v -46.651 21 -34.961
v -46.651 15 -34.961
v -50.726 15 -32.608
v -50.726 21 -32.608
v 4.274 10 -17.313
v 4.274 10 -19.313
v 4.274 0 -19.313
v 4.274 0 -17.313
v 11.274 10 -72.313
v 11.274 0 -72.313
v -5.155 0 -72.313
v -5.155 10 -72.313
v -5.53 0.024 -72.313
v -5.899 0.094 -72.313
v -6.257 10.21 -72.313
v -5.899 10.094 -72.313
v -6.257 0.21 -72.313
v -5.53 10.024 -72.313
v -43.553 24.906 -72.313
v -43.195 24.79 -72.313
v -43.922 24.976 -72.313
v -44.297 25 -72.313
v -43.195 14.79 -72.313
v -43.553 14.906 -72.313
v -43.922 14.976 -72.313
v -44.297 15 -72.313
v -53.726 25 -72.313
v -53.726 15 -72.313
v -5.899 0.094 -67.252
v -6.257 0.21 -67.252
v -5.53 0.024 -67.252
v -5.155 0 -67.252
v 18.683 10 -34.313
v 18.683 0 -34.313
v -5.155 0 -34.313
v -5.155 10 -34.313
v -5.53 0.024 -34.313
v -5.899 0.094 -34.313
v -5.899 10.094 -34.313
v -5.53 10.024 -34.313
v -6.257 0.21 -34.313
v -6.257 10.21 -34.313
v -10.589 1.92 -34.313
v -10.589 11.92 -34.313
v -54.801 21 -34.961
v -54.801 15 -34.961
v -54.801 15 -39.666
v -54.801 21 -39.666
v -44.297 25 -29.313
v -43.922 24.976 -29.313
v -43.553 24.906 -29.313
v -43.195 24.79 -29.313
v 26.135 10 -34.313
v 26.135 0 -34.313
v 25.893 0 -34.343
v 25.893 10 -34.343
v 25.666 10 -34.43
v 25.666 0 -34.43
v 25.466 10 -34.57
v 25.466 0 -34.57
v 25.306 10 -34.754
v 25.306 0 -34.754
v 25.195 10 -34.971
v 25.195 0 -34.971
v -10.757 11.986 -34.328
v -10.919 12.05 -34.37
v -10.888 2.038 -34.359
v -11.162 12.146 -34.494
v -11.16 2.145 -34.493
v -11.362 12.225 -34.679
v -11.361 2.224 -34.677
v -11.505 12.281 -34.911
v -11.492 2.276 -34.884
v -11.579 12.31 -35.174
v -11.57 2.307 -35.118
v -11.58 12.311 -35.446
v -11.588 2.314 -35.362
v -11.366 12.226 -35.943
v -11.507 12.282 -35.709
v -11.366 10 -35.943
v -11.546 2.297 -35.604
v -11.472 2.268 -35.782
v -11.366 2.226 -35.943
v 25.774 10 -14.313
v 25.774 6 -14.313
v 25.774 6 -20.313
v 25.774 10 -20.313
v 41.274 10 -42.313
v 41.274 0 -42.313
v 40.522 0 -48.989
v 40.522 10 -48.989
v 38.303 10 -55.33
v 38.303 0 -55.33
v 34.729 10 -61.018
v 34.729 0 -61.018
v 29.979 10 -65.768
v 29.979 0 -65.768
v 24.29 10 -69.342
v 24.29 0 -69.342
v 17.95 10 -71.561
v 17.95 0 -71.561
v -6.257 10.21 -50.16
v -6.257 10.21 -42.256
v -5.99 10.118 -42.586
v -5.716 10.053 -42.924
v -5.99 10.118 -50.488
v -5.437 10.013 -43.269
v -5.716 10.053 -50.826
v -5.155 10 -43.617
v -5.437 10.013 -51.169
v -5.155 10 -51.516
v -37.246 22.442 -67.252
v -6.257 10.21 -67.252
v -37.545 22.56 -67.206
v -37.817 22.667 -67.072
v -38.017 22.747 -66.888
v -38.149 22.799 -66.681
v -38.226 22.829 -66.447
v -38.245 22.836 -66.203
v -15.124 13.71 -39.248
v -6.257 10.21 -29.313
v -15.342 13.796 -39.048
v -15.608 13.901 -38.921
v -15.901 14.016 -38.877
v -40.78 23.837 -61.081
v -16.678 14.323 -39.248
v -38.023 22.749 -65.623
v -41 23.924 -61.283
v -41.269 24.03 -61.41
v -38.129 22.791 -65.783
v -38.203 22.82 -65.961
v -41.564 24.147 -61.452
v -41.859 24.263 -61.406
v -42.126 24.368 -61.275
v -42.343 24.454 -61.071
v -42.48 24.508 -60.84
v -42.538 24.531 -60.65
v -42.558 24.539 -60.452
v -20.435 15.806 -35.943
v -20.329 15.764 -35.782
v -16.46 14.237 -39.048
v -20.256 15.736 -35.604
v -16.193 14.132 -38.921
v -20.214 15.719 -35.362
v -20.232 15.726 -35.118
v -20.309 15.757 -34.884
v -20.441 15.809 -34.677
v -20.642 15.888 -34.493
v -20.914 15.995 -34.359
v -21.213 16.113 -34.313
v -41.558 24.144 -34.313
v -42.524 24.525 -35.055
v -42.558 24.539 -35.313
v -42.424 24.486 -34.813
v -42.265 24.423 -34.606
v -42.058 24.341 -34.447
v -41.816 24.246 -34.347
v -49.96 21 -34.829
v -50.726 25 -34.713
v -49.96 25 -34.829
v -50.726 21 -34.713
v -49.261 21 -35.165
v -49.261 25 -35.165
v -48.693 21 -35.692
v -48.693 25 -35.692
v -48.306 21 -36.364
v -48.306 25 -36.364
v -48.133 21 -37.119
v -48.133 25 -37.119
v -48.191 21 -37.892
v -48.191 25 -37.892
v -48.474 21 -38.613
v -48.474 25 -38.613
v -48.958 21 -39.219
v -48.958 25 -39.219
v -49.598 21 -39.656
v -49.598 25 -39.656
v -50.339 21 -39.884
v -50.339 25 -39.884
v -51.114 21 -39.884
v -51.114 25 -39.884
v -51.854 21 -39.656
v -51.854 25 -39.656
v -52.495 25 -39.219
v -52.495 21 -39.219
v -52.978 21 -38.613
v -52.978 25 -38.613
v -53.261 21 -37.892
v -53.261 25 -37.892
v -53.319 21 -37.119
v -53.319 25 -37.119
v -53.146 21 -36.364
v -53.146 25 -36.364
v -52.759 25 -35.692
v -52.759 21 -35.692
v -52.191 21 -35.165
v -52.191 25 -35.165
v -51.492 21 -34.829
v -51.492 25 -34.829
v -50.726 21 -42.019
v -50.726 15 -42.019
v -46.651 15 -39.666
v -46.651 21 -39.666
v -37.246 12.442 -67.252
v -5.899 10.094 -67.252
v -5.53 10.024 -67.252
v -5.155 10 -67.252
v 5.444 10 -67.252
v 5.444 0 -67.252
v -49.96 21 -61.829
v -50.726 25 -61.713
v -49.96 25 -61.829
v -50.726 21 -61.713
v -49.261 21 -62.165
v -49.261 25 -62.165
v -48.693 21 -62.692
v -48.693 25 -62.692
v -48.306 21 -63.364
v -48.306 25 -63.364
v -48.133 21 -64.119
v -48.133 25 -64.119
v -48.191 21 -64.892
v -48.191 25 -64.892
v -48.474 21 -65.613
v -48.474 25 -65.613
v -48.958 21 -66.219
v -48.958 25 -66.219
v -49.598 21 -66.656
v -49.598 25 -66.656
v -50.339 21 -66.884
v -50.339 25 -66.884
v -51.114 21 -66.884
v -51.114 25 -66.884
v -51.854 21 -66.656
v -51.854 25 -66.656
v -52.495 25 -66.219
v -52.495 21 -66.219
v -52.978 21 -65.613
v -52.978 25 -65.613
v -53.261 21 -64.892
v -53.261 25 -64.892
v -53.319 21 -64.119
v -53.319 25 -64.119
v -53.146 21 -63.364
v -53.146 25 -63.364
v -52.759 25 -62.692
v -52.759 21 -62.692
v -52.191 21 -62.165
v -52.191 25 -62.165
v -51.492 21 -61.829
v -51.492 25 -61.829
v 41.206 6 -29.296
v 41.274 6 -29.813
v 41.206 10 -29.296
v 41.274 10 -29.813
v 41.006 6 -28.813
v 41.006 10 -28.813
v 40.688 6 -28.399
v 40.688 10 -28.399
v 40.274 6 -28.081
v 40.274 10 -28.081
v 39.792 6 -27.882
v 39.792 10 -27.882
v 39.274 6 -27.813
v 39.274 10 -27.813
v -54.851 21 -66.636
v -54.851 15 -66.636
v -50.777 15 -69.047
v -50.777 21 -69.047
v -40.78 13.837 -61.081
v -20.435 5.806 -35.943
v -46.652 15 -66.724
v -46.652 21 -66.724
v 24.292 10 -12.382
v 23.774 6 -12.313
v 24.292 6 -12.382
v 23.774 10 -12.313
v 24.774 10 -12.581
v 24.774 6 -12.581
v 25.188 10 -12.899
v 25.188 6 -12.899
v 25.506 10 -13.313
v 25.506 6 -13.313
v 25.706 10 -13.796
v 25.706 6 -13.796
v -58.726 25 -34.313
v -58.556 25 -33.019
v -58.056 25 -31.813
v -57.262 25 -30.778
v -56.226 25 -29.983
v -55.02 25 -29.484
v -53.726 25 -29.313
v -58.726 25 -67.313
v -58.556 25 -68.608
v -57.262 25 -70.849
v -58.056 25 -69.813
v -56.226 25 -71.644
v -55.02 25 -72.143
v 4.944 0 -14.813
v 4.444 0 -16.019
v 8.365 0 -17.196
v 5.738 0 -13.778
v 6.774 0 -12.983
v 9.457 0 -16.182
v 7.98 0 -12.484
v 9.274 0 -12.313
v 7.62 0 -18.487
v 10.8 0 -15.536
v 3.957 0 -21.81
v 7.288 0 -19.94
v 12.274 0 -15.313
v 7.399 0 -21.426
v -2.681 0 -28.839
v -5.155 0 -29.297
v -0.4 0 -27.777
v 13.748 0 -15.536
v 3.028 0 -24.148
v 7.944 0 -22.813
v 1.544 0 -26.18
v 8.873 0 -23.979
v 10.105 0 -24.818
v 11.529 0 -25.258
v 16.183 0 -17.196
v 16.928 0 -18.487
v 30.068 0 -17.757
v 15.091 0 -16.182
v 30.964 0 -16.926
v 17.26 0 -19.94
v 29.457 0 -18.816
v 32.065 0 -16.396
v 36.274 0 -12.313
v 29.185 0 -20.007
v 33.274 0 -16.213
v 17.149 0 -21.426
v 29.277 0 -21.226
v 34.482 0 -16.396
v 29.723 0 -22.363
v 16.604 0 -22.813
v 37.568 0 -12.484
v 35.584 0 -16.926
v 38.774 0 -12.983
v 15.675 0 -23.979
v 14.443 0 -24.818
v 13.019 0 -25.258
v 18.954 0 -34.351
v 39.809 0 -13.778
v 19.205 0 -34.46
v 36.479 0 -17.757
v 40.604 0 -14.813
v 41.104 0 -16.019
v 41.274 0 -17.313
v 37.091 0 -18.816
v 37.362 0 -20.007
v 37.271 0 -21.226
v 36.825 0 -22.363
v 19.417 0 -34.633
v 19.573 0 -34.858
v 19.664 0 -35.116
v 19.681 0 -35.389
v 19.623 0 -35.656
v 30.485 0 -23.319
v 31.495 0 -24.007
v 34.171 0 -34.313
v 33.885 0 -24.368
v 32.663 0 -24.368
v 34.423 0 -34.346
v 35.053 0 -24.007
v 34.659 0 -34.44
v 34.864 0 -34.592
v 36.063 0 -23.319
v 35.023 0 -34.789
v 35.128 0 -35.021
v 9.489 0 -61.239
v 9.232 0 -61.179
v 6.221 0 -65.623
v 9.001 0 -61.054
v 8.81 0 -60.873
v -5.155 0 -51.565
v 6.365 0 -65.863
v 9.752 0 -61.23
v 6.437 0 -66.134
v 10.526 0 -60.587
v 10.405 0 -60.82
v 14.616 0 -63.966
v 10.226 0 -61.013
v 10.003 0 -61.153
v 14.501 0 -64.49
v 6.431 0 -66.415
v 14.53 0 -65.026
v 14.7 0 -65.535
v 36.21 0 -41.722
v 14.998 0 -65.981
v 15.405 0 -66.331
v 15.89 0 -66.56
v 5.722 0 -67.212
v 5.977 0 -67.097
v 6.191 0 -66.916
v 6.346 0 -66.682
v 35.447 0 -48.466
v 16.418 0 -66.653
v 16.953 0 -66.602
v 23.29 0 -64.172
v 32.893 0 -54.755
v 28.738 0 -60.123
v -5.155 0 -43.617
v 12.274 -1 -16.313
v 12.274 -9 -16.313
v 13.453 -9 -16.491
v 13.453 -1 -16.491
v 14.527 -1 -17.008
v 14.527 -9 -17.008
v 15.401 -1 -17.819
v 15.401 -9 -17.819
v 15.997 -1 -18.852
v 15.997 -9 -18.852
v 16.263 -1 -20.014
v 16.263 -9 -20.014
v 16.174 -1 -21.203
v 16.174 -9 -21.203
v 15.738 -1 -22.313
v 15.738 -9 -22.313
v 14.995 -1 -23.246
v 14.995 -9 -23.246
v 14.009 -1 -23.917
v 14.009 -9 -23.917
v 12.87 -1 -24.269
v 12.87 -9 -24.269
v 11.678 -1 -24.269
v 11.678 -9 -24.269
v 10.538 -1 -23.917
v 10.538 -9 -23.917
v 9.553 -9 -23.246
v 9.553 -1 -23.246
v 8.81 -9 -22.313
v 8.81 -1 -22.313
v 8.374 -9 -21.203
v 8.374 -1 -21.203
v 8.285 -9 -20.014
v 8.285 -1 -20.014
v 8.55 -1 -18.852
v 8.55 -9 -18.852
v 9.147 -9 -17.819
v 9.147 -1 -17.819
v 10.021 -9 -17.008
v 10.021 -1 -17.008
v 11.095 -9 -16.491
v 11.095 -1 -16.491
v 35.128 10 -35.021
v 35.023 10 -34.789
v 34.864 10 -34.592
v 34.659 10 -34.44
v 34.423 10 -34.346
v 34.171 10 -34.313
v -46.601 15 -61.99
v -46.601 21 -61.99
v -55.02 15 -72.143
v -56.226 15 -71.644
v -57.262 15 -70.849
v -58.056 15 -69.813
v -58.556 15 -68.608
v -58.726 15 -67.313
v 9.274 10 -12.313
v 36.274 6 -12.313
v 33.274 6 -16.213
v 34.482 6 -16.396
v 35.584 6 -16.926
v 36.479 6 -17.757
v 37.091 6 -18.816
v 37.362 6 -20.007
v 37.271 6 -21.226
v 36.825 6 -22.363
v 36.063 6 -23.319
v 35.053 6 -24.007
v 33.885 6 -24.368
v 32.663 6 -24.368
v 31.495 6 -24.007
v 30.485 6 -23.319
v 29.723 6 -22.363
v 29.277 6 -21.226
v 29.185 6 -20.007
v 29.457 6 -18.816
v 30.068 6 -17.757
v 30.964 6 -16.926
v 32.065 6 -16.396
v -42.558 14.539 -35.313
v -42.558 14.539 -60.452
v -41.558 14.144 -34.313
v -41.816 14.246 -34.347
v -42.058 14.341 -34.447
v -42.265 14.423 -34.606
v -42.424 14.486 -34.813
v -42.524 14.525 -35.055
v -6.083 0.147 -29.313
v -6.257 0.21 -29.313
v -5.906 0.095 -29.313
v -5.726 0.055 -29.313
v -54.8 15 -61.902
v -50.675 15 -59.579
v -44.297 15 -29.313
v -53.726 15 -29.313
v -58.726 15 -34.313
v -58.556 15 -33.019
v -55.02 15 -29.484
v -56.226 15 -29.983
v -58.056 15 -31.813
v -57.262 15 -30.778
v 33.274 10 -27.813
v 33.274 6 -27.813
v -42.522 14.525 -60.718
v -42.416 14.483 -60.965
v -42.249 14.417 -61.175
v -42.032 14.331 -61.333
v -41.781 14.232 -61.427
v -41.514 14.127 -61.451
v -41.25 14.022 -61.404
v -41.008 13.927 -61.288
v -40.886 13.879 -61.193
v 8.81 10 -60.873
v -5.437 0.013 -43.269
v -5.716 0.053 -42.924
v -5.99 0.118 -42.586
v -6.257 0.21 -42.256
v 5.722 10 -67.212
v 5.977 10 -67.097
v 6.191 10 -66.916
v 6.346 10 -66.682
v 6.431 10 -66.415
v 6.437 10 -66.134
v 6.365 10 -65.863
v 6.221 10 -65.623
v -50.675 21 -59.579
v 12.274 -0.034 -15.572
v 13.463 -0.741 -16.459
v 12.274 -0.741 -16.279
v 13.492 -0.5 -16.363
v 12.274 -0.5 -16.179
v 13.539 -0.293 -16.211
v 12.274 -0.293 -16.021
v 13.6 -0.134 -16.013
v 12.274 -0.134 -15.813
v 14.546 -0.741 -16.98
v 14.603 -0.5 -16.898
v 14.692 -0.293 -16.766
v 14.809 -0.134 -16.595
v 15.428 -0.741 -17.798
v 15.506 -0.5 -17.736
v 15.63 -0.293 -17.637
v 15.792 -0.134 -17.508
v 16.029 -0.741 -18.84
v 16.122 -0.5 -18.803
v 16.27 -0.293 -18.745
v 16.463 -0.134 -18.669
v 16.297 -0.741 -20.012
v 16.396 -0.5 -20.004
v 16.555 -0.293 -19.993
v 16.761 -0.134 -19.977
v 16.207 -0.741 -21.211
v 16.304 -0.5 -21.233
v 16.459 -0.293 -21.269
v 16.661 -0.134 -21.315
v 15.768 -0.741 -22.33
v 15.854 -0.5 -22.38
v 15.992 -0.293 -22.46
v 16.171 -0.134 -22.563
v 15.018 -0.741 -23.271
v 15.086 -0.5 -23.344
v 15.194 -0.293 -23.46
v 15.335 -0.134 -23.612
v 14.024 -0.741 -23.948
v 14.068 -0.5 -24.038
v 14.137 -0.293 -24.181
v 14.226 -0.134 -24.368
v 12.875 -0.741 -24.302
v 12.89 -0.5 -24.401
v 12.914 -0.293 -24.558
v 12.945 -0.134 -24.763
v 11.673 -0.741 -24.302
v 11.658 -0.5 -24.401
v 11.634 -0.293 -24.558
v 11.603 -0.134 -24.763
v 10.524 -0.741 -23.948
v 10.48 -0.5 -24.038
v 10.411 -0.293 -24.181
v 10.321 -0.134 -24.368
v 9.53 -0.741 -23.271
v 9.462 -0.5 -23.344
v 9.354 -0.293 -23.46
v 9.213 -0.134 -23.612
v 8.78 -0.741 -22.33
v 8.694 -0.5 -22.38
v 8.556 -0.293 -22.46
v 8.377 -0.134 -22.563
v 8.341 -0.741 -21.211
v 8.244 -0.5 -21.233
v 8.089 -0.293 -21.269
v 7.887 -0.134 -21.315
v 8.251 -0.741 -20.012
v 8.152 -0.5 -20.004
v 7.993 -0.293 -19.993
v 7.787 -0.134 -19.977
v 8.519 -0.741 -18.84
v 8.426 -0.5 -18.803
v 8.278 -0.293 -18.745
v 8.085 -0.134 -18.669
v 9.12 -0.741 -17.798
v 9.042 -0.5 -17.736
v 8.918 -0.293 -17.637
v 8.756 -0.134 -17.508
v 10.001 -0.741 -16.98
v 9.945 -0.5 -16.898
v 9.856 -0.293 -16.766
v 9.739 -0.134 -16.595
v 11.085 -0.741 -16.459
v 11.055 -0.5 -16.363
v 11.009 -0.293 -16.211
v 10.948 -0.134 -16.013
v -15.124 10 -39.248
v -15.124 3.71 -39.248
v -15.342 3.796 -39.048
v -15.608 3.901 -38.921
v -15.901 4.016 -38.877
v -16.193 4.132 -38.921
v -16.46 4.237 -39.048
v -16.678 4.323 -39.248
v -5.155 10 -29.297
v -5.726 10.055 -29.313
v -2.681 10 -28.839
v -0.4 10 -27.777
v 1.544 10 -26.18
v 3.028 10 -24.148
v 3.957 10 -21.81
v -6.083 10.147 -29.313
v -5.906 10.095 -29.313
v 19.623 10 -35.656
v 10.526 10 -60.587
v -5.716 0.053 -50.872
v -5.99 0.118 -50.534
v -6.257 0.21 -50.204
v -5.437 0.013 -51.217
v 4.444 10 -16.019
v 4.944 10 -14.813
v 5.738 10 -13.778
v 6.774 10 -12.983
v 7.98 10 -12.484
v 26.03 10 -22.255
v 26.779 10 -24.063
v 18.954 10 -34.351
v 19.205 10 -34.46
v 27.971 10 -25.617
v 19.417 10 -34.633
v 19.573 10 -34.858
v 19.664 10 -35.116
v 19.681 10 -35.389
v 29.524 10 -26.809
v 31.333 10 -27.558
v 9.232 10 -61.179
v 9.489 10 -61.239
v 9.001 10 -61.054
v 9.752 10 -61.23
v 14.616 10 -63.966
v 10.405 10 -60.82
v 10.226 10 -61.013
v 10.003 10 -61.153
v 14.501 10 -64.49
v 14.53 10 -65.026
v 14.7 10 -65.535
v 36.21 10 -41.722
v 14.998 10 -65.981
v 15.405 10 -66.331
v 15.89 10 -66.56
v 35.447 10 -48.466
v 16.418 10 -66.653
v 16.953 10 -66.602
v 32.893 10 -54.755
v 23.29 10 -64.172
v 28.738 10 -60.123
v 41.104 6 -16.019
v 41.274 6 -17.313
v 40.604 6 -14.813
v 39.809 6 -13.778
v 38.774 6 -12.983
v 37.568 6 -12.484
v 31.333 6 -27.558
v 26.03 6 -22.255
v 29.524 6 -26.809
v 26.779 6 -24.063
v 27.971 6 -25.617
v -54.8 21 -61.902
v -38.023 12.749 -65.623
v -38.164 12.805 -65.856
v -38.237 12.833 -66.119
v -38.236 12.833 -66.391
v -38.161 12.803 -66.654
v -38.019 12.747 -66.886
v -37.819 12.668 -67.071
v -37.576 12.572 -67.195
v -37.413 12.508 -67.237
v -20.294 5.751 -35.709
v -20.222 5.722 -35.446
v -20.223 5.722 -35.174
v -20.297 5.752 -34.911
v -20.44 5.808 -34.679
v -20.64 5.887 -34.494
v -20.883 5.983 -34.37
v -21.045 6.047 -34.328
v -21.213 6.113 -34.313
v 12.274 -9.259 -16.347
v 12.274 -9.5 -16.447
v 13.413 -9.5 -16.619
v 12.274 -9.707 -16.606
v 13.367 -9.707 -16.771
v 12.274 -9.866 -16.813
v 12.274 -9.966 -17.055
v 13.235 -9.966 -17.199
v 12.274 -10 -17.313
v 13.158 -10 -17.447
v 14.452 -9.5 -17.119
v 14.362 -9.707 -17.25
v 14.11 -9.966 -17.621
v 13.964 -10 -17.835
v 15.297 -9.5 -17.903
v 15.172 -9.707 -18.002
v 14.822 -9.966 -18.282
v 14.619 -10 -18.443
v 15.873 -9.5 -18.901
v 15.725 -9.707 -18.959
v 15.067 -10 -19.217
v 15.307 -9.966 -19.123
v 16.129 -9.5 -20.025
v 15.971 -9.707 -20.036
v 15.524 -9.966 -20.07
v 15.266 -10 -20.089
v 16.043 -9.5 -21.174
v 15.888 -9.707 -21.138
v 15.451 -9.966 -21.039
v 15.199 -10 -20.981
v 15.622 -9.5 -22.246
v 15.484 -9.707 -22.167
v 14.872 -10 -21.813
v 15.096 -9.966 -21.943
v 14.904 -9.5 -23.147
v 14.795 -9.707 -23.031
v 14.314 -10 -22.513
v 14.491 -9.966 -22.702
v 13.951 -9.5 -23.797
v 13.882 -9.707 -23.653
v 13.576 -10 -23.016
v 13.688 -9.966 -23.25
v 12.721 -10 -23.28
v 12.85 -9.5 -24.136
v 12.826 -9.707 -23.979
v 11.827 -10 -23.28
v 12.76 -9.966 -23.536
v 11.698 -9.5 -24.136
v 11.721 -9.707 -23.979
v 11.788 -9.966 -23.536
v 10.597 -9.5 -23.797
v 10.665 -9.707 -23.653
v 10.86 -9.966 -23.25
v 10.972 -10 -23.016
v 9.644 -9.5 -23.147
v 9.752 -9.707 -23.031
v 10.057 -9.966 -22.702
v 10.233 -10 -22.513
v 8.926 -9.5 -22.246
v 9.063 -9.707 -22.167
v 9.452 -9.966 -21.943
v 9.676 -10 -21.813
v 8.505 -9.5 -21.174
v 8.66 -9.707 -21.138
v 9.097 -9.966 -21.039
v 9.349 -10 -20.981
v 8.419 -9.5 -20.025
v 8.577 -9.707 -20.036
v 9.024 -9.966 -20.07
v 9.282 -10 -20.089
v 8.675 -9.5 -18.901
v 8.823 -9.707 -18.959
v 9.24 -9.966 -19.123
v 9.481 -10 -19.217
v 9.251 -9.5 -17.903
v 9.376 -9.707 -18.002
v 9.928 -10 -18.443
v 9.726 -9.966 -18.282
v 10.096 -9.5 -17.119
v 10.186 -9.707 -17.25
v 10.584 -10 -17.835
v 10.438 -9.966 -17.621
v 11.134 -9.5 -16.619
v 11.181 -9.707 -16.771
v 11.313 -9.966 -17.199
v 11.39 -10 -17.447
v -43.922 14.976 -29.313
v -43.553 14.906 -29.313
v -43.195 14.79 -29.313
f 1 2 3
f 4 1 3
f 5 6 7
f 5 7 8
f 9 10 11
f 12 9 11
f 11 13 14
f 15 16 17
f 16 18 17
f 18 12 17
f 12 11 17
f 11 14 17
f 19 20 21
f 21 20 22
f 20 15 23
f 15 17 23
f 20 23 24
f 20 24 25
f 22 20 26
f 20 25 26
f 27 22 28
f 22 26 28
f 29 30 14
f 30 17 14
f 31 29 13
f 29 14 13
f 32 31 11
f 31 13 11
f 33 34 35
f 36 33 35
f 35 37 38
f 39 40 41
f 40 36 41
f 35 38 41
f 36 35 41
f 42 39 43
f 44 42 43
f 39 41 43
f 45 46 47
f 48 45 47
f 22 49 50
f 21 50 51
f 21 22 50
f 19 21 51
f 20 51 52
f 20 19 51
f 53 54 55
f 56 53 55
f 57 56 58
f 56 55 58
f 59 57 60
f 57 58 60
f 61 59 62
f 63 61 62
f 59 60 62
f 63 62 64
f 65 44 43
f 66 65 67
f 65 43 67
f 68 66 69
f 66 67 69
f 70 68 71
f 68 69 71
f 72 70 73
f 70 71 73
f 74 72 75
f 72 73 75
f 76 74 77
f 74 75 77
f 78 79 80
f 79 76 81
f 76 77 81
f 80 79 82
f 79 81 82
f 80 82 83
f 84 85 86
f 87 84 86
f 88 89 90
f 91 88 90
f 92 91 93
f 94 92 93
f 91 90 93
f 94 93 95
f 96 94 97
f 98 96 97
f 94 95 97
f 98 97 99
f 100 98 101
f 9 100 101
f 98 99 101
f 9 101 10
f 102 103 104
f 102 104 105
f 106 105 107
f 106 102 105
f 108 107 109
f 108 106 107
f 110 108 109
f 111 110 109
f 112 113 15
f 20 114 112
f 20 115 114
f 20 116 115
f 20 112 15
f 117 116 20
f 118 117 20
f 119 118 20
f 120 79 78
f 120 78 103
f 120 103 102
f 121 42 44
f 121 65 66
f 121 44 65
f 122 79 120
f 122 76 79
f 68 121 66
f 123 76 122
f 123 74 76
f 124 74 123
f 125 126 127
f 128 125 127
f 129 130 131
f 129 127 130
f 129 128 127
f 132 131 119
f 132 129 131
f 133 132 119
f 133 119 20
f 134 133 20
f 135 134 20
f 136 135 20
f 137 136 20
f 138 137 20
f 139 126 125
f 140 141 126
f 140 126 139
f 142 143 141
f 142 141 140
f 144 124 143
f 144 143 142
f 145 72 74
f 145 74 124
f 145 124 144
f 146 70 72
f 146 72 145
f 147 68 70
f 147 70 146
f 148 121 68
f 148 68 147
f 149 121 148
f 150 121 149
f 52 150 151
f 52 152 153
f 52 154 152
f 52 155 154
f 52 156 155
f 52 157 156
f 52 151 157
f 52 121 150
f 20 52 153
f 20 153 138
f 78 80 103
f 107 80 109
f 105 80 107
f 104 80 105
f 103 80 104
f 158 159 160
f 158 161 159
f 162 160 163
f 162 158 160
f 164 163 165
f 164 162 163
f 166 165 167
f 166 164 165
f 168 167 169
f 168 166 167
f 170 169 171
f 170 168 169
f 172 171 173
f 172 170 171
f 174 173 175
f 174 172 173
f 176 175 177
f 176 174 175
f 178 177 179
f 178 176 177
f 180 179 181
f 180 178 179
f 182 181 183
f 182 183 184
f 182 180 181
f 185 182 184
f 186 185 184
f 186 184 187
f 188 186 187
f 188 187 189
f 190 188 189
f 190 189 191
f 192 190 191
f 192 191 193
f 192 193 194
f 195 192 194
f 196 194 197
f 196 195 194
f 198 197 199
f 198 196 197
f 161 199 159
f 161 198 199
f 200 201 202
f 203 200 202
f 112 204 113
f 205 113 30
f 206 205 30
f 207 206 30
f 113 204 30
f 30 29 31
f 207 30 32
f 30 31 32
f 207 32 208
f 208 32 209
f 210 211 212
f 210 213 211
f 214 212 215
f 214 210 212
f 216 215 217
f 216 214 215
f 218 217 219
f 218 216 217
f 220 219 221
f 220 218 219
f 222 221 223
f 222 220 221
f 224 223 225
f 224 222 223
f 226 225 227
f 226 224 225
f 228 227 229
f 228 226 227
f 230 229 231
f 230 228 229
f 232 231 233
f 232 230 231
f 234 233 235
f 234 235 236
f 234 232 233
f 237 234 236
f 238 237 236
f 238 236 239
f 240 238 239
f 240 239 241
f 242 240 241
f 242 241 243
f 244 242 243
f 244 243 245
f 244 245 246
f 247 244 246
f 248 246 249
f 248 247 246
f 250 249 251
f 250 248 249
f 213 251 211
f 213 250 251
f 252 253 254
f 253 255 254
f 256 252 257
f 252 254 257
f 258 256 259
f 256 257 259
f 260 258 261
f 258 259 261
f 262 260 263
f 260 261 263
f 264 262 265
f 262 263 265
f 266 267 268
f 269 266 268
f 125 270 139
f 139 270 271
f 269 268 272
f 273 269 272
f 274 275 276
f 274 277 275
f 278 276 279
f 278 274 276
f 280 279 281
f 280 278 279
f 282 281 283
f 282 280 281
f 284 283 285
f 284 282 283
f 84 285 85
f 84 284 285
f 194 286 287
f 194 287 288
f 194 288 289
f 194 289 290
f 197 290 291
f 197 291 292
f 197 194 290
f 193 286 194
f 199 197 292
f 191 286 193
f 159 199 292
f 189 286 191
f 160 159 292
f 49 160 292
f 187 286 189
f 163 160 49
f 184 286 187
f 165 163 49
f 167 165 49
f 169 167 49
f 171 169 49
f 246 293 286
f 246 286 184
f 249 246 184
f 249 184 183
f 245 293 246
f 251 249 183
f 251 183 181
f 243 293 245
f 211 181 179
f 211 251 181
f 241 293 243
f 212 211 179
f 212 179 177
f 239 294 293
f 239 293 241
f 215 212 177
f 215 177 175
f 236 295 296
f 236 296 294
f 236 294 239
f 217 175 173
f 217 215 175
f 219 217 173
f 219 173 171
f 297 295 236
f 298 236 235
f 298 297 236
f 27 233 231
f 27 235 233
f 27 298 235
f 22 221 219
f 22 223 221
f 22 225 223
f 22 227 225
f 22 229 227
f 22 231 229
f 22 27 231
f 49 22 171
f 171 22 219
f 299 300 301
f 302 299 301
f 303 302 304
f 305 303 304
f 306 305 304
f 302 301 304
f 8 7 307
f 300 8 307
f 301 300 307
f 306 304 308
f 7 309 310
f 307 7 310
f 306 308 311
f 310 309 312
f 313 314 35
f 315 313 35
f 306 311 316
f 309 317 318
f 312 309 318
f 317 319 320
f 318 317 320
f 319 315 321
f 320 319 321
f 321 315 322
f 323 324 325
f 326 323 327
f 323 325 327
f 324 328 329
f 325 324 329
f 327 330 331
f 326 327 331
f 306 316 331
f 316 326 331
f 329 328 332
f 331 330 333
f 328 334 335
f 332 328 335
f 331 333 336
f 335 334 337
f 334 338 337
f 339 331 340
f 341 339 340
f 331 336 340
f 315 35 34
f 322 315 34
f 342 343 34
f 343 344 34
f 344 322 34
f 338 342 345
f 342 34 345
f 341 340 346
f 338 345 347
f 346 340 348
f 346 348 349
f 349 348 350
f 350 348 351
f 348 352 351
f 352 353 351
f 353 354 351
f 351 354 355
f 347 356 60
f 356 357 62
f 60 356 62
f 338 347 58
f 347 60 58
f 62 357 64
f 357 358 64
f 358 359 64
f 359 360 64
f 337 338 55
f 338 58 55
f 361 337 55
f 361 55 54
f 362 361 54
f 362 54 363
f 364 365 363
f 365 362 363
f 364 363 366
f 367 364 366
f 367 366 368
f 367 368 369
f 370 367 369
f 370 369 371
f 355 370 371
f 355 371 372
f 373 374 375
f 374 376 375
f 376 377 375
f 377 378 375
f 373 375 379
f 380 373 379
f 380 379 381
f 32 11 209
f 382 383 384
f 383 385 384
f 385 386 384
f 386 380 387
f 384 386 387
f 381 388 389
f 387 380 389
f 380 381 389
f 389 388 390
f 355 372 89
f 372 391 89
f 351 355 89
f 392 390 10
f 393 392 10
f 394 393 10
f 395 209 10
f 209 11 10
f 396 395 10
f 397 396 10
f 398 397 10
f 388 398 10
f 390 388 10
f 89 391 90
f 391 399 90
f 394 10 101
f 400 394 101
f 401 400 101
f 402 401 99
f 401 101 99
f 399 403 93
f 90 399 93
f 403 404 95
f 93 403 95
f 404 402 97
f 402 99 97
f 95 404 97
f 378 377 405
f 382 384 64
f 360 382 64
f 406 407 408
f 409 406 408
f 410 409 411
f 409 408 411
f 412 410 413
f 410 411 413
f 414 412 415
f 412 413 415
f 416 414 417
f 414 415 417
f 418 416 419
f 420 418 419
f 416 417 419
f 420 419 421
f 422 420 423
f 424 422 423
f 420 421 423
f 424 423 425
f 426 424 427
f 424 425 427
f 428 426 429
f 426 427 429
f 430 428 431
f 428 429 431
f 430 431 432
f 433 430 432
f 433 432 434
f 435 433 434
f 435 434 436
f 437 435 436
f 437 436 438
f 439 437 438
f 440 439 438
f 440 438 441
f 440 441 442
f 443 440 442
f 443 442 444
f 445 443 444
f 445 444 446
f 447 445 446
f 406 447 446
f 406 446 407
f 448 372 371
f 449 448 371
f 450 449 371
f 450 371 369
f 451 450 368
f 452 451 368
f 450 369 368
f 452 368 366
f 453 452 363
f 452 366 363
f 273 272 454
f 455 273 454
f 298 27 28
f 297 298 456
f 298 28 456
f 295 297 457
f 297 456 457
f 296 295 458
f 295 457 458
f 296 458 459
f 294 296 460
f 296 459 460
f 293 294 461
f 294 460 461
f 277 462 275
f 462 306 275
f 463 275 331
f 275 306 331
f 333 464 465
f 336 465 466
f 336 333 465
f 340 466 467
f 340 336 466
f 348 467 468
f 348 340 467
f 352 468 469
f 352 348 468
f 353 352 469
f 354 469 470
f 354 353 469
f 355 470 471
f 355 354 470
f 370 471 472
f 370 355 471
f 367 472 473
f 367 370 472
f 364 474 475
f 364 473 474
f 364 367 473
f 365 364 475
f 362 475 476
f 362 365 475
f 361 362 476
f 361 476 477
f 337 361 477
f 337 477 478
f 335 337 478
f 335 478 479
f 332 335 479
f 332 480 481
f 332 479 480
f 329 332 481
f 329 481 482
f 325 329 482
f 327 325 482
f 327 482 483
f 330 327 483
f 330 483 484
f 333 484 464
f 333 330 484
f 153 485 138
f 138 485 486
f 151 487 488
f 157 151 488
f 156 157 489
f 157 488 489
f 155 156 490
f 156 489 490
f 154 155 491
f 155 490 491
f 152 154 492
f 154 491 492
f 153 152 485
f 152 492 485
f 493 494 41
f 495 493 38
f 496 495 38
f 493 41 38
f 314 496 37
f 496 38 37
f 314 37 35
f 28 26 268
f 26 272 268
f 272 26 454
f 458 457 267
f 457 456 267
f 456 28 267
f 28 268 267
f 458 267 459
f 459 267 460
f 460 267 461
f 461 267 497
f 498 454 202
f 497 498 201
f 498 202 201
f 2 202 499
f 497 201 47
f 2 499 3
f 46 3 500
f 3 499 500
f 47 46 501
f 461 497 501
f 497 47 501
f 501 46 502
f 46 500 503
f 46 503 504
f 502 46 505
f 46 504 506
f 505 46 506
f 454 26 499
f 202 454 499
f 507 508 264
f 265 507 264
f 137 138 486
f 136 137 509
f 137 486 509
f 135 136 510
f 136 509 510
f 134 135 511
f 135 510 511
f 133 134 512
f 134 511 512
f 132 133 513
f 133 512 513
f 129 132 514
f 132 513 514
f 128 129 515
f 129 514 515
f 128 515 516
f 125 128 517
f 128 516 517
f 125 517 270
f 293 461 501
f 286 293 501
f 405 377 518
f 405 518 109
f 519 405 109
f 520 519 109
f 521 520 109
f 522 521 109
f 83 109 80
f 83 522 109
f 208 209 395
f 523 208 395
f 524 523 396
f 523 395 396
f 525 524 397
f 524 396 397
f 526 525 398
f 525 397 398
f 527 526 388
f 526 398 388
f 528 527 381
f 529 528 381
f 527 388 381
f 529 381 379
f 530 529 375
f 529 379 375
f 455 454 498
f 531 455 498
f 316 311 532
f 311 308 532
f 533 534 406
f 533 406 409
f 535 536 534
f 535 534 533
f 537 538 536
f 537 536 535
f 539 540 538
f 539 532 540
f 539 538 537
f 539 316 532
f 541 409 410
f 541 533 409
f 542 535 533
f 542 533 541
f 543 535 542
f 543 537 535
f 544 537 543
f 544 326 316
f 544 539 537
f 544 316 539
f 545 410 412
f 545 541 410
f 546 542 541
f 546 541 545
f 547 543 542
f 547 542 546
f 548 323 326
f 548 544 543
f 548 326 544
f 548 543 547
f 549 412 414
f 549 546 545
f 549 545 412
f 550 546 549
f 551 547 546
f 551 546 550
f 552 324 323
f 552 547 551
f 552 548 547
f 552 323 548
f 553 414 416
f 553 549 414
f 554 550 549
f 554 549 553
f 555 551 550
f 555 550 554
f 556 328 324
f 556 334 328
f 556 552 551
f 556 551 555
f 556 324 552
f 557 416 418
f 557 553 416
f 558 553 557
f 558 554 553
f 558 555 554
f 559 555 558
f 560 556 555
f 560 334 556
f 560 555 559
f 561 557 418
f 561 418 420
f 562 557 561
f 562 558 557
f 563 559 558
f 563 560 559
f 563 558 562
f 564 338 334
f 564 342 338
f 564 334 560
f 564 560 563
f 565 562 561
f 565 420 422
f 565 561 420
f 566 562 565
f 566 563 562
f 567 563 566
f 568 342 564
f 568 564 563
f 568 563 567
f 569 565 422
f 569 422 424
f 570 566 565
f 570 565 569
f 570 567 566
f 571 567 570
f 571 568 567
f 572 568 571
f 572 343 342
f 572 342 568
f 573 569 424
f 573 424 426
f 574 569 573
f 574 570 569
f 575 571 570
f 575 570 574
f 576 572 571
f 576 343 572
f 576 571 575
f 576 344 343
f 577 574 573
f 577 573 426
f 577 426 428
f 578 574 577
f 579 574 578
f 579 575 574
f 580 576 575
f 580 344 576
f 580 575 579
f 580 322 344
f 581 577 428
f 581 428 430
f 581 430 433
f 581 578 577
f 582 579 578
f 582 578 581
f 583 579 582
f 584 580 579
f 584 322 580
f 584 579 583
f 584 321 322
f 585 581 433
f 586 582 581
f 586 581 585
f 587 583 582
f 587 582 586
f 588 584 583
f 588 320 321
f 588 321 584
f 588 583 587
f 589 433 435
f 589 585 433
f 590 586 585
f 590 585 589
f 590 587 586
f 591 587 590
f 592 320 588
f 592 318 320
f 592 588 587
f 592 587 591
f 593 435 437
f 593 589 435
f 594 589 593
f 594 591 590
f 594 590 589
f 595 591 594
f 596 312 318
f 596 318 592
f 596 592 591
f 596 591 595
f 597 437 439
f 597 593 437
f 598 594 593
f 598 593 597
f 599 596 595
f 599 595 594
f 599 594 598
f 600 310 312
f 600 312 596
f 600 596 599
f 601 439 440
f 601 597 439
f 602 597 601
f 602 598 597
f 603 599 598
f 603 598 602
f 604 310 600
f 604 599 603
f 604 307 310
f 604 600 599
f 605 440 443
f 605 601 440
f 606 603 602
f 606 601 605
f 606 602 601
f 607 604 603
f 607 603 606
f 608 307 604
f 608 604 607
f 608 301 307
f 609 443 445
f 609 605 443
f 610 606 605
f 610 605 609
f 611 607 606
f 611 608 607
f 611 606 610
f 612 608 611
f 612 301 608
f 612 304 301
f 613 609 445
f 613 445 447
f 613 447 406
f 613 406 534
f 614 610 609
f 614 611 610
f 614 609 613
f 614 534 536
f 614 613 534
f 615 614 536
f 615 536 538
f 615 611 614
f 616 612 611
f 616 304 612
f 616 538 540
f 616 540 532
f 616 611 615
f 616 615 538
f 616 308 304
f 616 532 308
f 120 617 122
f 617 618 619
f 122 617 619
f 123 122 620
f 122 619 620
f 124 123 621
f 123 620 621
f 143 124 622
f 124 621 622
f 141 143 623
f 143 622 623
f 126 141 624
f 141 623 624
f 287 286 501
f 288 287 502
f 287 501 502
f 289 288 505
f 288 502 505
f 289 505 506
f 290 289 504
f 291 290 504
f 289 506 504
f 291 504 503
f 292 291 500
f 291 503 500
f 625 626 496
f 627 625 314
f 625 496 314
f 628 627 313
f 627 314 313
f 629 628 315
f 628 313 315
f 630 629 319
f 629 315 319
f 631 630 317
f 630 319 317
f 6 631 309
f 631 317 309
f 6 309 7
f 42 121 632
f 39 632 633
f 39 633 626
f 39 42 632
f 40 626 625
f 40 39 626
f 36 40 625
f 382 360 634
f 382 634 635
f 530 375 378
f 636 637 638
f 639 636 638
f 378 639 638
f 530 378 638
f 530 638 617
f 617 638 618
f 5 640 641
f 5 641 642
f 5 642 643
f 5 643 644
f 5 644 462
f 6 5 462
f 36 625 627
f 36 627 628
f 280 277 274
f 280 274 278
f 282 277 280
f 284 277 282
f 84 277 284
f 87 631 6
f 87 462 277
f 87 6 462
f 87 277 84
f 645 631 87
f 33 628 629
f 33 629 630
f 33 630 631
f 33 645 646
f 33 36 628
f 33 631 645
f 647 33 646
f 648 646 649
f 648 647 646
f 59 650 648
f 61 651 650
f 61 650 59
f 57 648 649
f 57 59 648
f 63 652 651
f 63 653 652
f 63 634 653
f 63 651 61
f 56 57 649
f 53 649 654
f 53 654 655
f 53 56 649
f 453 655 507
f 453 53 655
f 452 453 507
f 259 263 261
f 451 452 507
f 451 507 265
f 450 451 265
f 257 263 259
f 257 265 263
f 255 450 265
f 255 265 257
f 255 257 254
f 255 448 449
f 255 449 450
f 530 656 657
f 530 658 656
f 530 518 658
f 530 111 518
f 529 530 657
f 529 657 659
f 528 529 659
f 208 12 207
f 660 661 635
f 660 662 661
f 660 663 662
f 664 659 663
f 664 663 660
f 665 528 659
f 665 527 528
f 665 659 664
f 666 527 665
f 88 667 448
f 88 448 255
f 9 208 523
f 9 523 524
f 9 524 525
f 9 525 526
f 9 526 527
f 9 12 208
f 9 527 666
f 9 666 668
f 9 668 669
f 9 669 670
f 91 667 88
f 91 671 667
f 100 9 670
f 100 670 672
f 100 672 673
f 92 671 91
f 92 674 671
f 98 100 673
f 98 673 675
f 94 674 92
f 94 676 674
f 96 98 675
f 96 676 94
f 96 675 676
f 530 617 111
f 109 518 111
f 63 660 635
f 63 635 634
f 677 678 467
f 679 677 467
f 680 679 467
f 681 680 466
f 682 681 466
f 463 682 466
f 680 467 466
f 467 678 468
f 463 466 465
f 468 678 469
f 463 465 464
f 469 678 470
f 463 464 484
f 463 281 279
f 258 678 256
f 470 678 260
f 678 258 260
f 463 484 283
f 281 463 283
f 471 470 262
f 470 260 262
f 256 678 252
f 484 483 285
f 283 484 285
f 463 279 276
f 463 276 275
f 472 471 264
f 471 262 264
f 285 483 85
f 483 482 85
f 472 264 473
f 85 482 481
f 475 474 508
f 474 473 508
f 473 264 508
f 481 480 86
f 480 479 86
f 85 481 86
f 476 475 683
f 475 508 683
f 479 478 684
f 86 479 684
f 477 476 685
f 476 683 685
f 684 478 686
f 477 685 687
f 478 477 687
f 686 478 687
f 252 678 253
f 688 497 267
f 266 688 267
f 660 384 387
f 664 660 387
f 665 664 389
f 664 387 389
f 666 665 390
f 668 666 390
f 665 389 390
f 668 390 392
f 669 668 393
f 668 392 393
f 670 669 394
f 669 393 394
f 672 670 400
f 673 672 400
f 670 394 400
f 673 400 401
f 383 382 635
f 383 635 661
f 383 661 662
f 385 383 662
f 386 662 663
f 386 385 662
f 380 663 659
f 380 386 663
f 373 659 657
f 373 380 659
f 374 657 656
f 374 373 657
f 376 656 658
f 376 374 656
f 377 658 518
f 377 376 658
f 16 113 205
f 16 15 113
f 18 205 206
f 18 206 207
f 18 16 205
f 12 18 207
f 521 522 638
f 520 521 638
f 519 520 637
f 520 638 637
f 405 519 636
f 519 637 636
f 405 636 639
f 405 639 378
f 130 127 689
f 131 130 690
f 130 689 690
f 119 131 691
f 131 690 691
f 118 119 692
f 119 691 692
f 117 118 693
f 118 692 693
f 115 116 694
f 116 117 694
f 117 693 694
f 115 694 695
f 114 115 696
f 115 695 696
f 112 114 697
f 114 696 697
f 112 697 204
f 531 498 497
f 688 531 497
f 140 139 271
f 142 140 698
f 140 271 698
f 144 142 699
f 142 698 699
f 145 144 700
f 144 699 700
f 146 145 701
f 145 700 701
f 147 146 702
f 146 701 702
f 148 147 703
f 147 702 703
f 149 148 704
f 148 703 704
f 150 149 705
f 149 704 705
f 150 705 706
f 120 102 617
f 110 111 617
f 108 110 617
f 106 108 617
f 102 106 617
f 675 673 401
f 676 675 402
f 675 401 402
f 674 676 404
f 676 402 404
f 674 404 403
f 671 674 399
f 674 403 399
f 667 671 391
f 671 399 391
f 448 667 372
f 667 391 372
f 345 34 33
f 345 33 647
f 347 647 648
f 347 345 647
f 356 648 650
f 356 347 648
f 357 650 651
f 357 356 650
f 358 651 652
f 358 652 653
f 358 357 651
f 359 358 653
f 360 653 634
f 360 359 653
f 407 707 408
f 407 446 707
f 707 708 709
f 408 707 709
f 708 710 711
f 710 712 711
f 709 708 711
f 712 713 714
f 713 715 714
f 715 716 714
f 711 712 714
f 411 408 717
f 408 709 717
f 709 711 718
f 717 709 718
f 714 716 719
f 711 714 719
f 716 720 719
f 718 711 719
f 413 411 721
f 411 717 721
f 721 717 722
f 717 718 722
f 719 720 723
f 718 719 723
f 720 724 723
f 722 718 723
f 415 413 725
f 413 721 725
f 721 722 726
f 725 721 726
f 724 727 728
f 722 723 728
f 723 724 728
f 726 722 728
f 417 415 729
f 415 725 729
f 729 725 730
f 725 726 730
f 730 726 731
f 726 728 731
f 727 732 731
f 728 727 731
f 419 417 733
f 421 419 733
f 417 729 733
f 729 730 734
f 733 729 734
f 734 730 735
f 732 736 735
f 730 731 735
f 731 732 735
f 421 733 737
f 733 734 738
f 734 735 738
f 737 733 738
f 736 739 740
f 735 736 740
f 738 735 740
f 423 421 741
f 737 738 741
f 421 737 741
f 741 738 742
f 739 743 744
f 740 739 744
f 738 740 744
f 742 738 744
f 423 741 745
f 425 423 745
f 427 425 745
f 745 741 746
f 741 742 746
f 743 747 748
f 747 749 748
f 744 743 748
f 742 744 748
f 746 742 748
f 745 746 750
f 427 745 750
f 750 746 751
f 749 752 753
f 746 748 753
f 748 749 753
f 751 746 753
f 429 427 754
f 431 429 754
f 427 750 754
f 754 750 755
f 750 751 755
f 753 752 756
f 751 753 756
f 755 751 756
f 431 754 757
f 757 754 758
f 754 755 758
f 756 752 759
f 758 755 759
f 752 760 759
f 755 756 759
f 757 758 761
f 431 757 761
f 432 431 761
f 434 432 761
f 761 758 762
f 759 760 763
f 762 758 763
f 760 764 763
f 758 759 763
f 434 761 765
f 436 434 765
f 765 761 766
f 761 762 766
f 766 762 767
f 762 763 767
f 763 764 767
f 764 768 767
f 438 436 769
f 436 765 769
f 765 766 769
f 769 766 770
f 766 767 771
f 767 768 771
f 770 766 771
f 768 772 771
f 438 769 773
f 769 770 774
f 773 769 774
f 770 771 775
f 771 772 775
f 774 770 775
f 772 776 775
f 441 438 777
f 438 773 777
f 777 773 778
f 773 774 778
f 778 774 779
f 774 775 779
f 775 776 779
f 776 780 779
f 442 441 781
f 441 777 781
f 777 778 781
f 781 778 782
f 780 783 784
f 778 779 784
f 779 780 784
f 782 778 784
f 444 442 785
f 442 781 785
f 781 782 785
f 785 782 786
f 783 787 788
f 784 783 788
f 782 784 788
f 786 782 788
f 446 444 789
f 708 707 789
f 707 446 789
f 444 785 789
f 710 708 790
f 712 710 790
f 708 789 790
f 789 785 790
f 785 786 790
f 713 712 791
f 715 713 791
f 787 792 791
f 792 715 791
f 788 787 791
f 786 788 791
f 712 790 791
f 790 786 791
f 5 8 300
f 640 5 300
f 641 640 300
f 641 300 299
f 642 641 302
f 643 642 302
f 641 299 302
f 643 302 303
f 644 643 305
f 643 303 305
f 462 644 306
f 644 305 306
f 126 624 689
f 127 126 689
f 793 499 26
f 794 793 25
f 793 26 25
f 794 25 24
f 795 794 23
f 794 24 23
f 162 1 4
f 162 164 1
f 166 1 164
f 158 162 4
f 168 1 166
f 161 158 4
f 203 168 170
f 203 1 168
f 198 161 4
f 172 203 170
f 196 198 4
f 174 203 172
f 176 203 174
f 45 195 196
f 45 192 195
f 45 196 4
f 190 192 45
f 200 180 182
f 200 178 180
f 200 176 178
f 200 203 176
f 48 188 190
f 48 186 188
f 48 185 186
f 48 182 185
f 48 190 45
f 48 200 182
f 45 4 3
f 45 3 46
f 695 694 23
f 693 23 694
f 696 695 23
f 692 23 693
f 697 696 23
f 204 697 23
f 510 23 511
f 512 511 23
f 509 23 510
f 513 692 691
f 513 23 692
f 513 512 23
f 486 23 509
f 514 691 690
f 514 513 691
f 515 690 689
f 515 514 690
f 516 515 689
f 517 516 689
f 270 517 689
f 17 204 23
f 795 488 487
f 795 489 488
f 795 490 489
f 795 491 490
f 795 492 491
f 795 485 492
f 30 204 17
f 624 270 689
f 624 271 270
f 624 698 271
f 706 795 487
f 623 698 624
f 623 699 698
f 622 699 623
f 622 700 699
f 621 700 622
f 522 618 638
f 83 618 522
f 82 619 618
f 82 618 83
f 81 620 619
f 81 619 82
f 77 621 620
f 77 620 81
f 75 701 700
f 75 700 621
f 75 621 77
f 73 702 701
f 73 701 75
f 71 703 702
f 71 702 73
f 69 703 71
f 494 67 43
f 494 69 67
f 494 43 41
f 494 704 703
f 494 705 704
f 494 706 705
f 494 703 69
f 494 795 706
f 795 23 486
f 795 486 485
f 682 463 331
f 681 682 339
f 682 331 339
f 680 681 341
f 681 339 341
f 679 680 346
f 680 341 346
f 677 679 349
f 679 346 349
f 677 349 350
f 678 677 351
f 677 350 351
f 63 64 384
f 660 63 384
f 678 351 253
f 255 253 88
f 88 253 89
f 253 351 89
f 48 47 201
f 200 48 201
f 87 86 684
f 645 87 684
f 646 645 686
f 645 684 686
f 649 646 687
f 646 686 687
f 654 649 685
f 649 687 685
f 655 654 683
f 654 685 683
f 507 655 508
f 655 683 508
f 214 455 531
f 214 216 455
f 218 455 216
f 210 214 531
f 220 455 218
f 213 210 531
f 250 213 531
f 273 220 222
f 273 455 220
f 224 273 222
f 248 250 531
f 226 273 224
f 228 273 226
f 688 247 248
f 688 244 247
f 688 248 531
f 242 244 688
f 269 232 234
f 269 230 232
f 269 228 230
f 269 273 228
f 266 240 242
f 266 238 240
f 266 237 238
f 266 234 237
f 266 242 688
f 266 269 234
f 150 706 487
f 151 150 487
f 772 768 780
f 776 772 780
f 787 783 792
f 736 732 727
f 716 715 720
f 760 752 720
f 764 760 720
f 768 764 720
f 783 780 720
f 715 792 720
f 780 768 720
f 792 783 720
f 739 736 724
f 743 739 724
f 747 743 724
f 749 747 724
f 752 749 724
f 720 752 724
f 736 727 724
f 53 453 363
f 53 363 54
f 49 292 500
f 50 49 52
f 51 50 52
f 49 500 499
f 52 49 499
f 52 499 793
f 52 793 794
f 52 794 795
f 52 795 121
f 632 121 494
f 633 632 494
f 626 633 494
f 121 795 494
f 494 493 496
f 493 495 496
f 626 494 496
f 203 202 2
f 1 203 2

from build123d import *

# Parameters (mm, degrees)
SKETCH1_R           = 4.1
SKETCH1_R_2         = 4
SKETCH1_R_3         = 2.6
BOSS_EXTRUDE1_DEPTH = 10
CUT_EXTRUDE1_START  = -4
CUT_EXTRUDE1_DEPTH  = 4
FILLET1_R           = 2
BOSS_EXTRUDE2_START = -20
SKETCH3_R           = 4
BOSS_EXTRUDE2_DEPTH = 20
FILLET2_R           = 1
SKETCH4_R           = 2.6
BOSS_EXTRUDE3_DEPTH = 15
CUT_EXTRUDE2_REACH  = 78.959
FILLET3_R           = 3
CUT_EXTRUDE3_DEPTH  = 6


with BuildPart() as part:
    # Sketch1 → Boss-Extrude1 (new body)
    with BuildSketch(Plane(origin=(0, 0, 0), x_dir=(1, 0, 0), z_dir=(0, 1, 0))):
        with BuildLine():
            Line((11.273947383, 72.313413723), (4.792068361, 72.313413723))
            Line((4.792068361, 72.313413723), (-53.726052617, 72.313413723))
            ThreePointArc((-53.726052617, 72.313413723), (-57.261586523, 70.848947629), (-58.726052617, 67.313413723))
            Line((-58.726052617, 67.313413723), (-58.726052617, 34.313413723))
            ThreePointArc((-58.726052617, 34.313413723), (-57.261586523, 30.777879817), (-53.726052617, 29.313413723))
            Line((-53.726052617, 29.313413723), (-5.726052617, 29.313413723))
            ThreePointArc((-5.726052617, 29.313413723), (1.345015195, 26.384481534), (4.273947383, 19.313413723))
            Line((4.273947383, 19.313413723), (4.273947383, 17.313413723))
            ThreePointArc((4.273947383, 17.313413723), (5.738413477, 13.777879817), (9.273947383, 12.313413723))
            Line((9.273947383, 12.313413723), (36.273947383, 12.313413723))
            ThreePointArc((36.273947383, 12.313413723), (39.809481289, 13.777879817), (41.273947383, 17.313413723))
            Line((41.273947383, 17.313413723), (41.273947383, 42.313413723))
            ThreePointArc((41.273947383, 42.313413723), (32.487150819, 63.526617158), (11.273947383, 72.313413723))
        make_face()
        with Locations((33.273947383, 20.313413723)):
            Circle(SKETCH1_R, mode=Mode.SUBTRACT)
        with Locations((12.273947383, 20.313413723)):
            Circle(SKETCH1_R_2, mode=Mode.SUBTRACT)
        with Locations((-50.726052617, 64.313413723)):
            Circle(SKETCH1_R_3, mode=Mode.SUBTRACT)
        with Locations((-50.726052617, 37.313413723)):
            Circle(SKETCH1_R_3, mode=Mode.SUBTRACT)
        with BuildLine():
            Line((34.171420048, 34.313413723), (26.134777641, 34.313413723))
            ThreePointArc((26.134777641, 34.313413723), (25.561526201, 34.49403421), (25.19535667, 34.97064815))
            Line((25.19535667, 34.97064815), (14.615821544, 63.966084002))
            ThreePointArc((14.615821544, 63.966084002), (14.998488248, 65.980552022), (16.952543045, 66.601989919))
            ThreePointArc((16.952543045, 66.601989919), (32.892900514, 54.755368869), (35.127730175, 35.021059585))
            ThreePointArc((35.127730175, 35.021059585), (34.766250218, 34.509562325), (34.171420048, 34.313413723))
        make_face(mode=Mode.SUBTRACT)
        with BuildLine():
            Line((-42.557674575, 35.313413723), (-42.557674575, 60.452375226))
            ThreePointArc((-42.557674575, 60.452375226), (-41.891342574, 61.395065879), (-40.780343242, 61.081466633))
            Line((-40.780343242, 61.081466633), (-20.435473581, 35.94250513))
            ThreePointArc((-20.435473581, 35.94250513), (-20.310283056, 34.882769674), (-21.212804914, 34.313413723))
            Line((-21.212804914, 34.313413723), (-41.557674575, 34.313413723))
            ThreePointArc((-41.557674575, 34.313413723), (-42.264781356, 34.606306941), (-42.557674575, 35.313413723))
        make_face(mode=Mode.SUBTRACT)
        with BuildLine():
            Line((-37.245793747, 67.251595954), (5.443945576, 67.251595954))
            ThreePointArc((5.443945576, 67.251595954), (6.346467434, 66.682240002), (6.221276909, 65.622504547))
            Line((6.221276909, 65.622504547), (-15.123592752, 39.247901728))
            ThreePointArc((-15.123592752, 39.247901728), (-15.900924085, 38.876993135), (-16.678255419, 39.247901728))
            Line((-16.678255419, 39.247901728), (-38.02312508, 65.622504547))
            ThreePointArc((-38.02312508, 65.622504547), (-38.148315604, 66.682240002), (-37.245793747, 67.251595954))
        make_face(mode=Mode.SUBTRACT)
        with BuildLine():
            Line((19.622800135, 35.656179295), (10.526467022, 60.58658882))
            ThreePointArc((10.526467022, 60.58658882), (9.751557094, 61.230198488), (8.809714717, 60.872914654))
            Line((8.809714717, 60.872914654), (-11.36637459, 35.94250513))
            ThreePointArc((-11.36637459, 35.94250513), (-11.491565114, 34.882769674), (-10.589043257, 34.313413723))
            Line((-10.589043257, 34.313413723), (18.683379163, 34.313413723))
            ThreePointArc((18.683379163, 34.313413723), (19.502758676, 34.740162282), (19.622800135, 35.656179295))
        make_face(mode=Mode.SUBTRACT)
    extrude(amount=BOSS_EXTRUDE1_DEPTH)

    # Sketch2 → Cut-Extrude1 (cut)
    with BuildSketch(Plane(origin=(0, 10, 0), x_dir=(1, 0, 0), z_dir=(0, 1, 0)).offset(CUT_EXTRUDE1_START)):
        with BuildLine():
            Line((33.273947383, 27.813413723), (41.273947383, 27.813413723))
            Line((41.273947383, 27.813413723), (41.273947383, 17.313413723))
            ThreePointArc((41.273947383, 17.313413723), (39.809481289, 13.777879817), (36.273947383, 12.313413723))
            Line((36.273947383, 12.313413723), (25.773947383, 12.313413723))
            Line((25.773947383, 12.313413723), (25.773947383, 20.313413723))
            ThreePointArc((25.773947383, 20.313413723), (27.970646524, 25.616714582), (33.273947383, 27.813413723))
        make_face()
    extrude(amount=CUT_EXTRUDE1_DEPTH, mode=Mode.SUBTRACT)

    # Fillet1
    fillet1_edges = [part.edges().sort_by_distance(p)[0] for p in [
        (41.273947383, 8, -27.813413723),
        (25.773947383, 8, -12.313413723),
    ]]
    fillet(fillet1_edges, radius=FILLET1_R)

    # Sketch3 → Boss-Extrude2 (add)
    with BuildSketch(Plane(origin=(0, 10, 0), x_dir=(1, 0, 0), z_dir=(0, 1, 0)).offset(BOSS_EXTRUDE2_START)):
        with Locations((12.273947383, 20.313413723)):
            Circle(SKETCH3_R)
    extrude(amount=BOSS_EXTRUDE2_DEPTH)

    # Fillet2
    fillet2_edges = [part.edges().sort_by_distance(p)[0] for p in [
        (8.273947383, -10, -20.313413723),
        (8.273947383, 0, -20.313413723),
    ]]
    fillet(fillet2_edges, radius=FILLET2_R)

    # Sketch4 → Boss-Extrude3 (add)
    with BuildSketch(Plane(origin=(0, 10, 0), x_dir=(1, 0, 0), z_dir=(0, 1, 0))):
        with BuildLine():
            Line((-58.726052617, 67.313413723), (-58.726052617, 34.313413723))
            ThreePointArc((-58.726052617, 34.313413723), (-57.261586523, 30.777879817), (-53.726052617, 29.313413723))
            Line((-53.726052617, 29.313413723), (-5.726052617, 29.313413723))
            Line((-5.726052617, 29.313413723), (-5.726052617, 34.313413723))
            Line((-5.726052617, 34.313413723), (-10.589043257, 34.313413723))
            ThreePointArc((-10.589043257, 34.313413723), (-11.491565114, 34.882769674), (-11.36637459, 35.94250513))
            Line((-11.36637459, 35.94250513), (-5.726052617, 42.91191999))
            Line((-5.726052617, 42.91191999), (-5.726052617, 50.813413723))
            Line((-5.726052617, 50.813413723), (-15.123592752, 39.247901728))
            ThreePointArc((-15.123592752, 39.247901728), (-15.900924085, 38.876993135), (-16.678255419, 39.247901728))
            Line((-16.678255419, 39.247901728), (-38.02312508, 65.622504547))
            ThreePointArc((-38.02312508, 65.622504547), (-38.148315604, 66.682240002), (-37.245793747, 67.251595954))
            Line((-37.245793747, 67.251595954), (-5.726052617, 67.251595954))
            Line((-5.726052617, 67.251595954), (-5.726052617, 72.313413723))
            Line((-5.726052617, 72.313413723), (-53.726052617, 72.313413723))
            ThreePointArc((-53.726052617, 72.313413723), (-57.261586523, 70.848947629), (-58.726052617, 67.313413723))
        make_face()
        with Locations((-50.726052617, 64.313413723)):
            Circle(SKETCH4_R, mode=Mode.SUBTRACT)
        with Locations((-50.726052617, 37.313413723)):
            Circle(SKETCH4_R, mode=Mode.SUBTRACT)
        with BuildLine():
            Line((-40.780343242, 61.081466633), (-20.435473581, 35.94250513))
            ThreePointArc((-20.435473581, 35.94250513), (-20.310283056, 34.882769674), (-21.212804914, 34.313413723))
            Line((-21.212804914, 34.313413723), (-41.557674575, 34.313413723))
            ThreePointArc((-41.557674575, 34.313413723), (-42.264781356, 34.606306941), (-42.557674575, 35.313413723))
            Line((-42.557674575, 35.313413723), (-42.557674575, 60.452375226))
            ThreePointArc((-42.557674575, 60.452375226), (-41.891342574, 61.395065879), (-40.780343242, 61.081466633))
        make_face(mode=Mode.SUBTRACT)
    extrude(amount=BOSS_EXTRUDE3_DEPTH)

    # Sketch5 → Cut-Extrude2 (cut, up to next)
    with BuildSketch(Plane.XY.offset(-29.313413723), mode=Mode.PRIVATE) as cut_extrude2_sk1:
        Polygon((-5.726052617, 10), (-43.726052617, 25), (-5.726052617, 25), align=None)
    cut_extrude2_tool1 = extrude(cut_extrude2_sk1.sketch, amount=-CUT_EXTRUDE2_REACH, mode=Mode.PRIVATE) & part.part
    # Sketch5 → Cut-Extrude2 (cut, up to next)
    with BuildSketch(Plane.XY.offset(-29.313413723), mode=Mode.PRIVATE) as cut_extrude2_sk2:
        Polygon((-53.726052617, 15), (-43.726052617, 15), (-5.726052617, 0), (-60.945305148, 0), (-60.945305148, 15), align=None)
    cut_extrude2_tool2 = extrude(cut_extrude2_sk2.sketch, amount=-CUT_EXTRUDE2_REACH, mode=Mode.PRIVATE) & part.part
    add(cut_extrude2_tool1.solids().sort_by_distance((-18.392719, 20, -29.313414))[0], mode=Mode.SUBTRACT)
    add(cut_extrude2_tool2.solids().sort_by_distance((-41.1745, 6.188543, -29.313414))[0], mode=Mode.SUBTRACT)

    # Fillet3
    fillet3_edges = [part.edges().sort_by_distance(p)[0] for p in [
        (-5.726052617, 10, -31.813413723),
        (-5.726052617, 10, -46.862666856),
        (-5.726052617, 10, -69.782504838),
        (-43.726052617, 15, -50.813413723),
    ]]
    fillet(fillet3_edges, radius=FILLET3_R)
    fillet3_2_edges = [part.edges().sort_by_distance(p)[0] for p in [
        (-43.726052617, 25, -50.813413723),
        (-5.726052617, 0, -69.782504838),
        (-5.726052617, 0, -46.885905285),
        (-5.726052617, 0, -31.813413723),
    ]]
    fillet(fillet3_2_edges, radius=FILLET3_R)

    # Sketch6 → Cut-Extrude3 (cut)
    with BuildSketch(Plane(origin=(0, 15, 0), x_dir=(-1, 0, 0), z_dir=(0, -1, 0))):
        Polygon((54.800383951, 61.902364674), (54.85124801, 66.636363637), (50.776916675, 69.047412686), (46.651721283, 66.724462771), (46.600857225, 61.990463808), (50.675188559, 59.57941476), align=None)
        Polygon((54.801038143, 39.66614114), (50.726023668, 42.018818416), (46.651038143, 39.666090999), (46.651067091, 34.960686305), (50.726081566, 32.608009029), (54.801067091, 34.960736446), align=None)
    extrude(amount=-CUT_EXTRUDE3_DEPTH, mode=Mode.SUBTRACT)


solid = part.part
